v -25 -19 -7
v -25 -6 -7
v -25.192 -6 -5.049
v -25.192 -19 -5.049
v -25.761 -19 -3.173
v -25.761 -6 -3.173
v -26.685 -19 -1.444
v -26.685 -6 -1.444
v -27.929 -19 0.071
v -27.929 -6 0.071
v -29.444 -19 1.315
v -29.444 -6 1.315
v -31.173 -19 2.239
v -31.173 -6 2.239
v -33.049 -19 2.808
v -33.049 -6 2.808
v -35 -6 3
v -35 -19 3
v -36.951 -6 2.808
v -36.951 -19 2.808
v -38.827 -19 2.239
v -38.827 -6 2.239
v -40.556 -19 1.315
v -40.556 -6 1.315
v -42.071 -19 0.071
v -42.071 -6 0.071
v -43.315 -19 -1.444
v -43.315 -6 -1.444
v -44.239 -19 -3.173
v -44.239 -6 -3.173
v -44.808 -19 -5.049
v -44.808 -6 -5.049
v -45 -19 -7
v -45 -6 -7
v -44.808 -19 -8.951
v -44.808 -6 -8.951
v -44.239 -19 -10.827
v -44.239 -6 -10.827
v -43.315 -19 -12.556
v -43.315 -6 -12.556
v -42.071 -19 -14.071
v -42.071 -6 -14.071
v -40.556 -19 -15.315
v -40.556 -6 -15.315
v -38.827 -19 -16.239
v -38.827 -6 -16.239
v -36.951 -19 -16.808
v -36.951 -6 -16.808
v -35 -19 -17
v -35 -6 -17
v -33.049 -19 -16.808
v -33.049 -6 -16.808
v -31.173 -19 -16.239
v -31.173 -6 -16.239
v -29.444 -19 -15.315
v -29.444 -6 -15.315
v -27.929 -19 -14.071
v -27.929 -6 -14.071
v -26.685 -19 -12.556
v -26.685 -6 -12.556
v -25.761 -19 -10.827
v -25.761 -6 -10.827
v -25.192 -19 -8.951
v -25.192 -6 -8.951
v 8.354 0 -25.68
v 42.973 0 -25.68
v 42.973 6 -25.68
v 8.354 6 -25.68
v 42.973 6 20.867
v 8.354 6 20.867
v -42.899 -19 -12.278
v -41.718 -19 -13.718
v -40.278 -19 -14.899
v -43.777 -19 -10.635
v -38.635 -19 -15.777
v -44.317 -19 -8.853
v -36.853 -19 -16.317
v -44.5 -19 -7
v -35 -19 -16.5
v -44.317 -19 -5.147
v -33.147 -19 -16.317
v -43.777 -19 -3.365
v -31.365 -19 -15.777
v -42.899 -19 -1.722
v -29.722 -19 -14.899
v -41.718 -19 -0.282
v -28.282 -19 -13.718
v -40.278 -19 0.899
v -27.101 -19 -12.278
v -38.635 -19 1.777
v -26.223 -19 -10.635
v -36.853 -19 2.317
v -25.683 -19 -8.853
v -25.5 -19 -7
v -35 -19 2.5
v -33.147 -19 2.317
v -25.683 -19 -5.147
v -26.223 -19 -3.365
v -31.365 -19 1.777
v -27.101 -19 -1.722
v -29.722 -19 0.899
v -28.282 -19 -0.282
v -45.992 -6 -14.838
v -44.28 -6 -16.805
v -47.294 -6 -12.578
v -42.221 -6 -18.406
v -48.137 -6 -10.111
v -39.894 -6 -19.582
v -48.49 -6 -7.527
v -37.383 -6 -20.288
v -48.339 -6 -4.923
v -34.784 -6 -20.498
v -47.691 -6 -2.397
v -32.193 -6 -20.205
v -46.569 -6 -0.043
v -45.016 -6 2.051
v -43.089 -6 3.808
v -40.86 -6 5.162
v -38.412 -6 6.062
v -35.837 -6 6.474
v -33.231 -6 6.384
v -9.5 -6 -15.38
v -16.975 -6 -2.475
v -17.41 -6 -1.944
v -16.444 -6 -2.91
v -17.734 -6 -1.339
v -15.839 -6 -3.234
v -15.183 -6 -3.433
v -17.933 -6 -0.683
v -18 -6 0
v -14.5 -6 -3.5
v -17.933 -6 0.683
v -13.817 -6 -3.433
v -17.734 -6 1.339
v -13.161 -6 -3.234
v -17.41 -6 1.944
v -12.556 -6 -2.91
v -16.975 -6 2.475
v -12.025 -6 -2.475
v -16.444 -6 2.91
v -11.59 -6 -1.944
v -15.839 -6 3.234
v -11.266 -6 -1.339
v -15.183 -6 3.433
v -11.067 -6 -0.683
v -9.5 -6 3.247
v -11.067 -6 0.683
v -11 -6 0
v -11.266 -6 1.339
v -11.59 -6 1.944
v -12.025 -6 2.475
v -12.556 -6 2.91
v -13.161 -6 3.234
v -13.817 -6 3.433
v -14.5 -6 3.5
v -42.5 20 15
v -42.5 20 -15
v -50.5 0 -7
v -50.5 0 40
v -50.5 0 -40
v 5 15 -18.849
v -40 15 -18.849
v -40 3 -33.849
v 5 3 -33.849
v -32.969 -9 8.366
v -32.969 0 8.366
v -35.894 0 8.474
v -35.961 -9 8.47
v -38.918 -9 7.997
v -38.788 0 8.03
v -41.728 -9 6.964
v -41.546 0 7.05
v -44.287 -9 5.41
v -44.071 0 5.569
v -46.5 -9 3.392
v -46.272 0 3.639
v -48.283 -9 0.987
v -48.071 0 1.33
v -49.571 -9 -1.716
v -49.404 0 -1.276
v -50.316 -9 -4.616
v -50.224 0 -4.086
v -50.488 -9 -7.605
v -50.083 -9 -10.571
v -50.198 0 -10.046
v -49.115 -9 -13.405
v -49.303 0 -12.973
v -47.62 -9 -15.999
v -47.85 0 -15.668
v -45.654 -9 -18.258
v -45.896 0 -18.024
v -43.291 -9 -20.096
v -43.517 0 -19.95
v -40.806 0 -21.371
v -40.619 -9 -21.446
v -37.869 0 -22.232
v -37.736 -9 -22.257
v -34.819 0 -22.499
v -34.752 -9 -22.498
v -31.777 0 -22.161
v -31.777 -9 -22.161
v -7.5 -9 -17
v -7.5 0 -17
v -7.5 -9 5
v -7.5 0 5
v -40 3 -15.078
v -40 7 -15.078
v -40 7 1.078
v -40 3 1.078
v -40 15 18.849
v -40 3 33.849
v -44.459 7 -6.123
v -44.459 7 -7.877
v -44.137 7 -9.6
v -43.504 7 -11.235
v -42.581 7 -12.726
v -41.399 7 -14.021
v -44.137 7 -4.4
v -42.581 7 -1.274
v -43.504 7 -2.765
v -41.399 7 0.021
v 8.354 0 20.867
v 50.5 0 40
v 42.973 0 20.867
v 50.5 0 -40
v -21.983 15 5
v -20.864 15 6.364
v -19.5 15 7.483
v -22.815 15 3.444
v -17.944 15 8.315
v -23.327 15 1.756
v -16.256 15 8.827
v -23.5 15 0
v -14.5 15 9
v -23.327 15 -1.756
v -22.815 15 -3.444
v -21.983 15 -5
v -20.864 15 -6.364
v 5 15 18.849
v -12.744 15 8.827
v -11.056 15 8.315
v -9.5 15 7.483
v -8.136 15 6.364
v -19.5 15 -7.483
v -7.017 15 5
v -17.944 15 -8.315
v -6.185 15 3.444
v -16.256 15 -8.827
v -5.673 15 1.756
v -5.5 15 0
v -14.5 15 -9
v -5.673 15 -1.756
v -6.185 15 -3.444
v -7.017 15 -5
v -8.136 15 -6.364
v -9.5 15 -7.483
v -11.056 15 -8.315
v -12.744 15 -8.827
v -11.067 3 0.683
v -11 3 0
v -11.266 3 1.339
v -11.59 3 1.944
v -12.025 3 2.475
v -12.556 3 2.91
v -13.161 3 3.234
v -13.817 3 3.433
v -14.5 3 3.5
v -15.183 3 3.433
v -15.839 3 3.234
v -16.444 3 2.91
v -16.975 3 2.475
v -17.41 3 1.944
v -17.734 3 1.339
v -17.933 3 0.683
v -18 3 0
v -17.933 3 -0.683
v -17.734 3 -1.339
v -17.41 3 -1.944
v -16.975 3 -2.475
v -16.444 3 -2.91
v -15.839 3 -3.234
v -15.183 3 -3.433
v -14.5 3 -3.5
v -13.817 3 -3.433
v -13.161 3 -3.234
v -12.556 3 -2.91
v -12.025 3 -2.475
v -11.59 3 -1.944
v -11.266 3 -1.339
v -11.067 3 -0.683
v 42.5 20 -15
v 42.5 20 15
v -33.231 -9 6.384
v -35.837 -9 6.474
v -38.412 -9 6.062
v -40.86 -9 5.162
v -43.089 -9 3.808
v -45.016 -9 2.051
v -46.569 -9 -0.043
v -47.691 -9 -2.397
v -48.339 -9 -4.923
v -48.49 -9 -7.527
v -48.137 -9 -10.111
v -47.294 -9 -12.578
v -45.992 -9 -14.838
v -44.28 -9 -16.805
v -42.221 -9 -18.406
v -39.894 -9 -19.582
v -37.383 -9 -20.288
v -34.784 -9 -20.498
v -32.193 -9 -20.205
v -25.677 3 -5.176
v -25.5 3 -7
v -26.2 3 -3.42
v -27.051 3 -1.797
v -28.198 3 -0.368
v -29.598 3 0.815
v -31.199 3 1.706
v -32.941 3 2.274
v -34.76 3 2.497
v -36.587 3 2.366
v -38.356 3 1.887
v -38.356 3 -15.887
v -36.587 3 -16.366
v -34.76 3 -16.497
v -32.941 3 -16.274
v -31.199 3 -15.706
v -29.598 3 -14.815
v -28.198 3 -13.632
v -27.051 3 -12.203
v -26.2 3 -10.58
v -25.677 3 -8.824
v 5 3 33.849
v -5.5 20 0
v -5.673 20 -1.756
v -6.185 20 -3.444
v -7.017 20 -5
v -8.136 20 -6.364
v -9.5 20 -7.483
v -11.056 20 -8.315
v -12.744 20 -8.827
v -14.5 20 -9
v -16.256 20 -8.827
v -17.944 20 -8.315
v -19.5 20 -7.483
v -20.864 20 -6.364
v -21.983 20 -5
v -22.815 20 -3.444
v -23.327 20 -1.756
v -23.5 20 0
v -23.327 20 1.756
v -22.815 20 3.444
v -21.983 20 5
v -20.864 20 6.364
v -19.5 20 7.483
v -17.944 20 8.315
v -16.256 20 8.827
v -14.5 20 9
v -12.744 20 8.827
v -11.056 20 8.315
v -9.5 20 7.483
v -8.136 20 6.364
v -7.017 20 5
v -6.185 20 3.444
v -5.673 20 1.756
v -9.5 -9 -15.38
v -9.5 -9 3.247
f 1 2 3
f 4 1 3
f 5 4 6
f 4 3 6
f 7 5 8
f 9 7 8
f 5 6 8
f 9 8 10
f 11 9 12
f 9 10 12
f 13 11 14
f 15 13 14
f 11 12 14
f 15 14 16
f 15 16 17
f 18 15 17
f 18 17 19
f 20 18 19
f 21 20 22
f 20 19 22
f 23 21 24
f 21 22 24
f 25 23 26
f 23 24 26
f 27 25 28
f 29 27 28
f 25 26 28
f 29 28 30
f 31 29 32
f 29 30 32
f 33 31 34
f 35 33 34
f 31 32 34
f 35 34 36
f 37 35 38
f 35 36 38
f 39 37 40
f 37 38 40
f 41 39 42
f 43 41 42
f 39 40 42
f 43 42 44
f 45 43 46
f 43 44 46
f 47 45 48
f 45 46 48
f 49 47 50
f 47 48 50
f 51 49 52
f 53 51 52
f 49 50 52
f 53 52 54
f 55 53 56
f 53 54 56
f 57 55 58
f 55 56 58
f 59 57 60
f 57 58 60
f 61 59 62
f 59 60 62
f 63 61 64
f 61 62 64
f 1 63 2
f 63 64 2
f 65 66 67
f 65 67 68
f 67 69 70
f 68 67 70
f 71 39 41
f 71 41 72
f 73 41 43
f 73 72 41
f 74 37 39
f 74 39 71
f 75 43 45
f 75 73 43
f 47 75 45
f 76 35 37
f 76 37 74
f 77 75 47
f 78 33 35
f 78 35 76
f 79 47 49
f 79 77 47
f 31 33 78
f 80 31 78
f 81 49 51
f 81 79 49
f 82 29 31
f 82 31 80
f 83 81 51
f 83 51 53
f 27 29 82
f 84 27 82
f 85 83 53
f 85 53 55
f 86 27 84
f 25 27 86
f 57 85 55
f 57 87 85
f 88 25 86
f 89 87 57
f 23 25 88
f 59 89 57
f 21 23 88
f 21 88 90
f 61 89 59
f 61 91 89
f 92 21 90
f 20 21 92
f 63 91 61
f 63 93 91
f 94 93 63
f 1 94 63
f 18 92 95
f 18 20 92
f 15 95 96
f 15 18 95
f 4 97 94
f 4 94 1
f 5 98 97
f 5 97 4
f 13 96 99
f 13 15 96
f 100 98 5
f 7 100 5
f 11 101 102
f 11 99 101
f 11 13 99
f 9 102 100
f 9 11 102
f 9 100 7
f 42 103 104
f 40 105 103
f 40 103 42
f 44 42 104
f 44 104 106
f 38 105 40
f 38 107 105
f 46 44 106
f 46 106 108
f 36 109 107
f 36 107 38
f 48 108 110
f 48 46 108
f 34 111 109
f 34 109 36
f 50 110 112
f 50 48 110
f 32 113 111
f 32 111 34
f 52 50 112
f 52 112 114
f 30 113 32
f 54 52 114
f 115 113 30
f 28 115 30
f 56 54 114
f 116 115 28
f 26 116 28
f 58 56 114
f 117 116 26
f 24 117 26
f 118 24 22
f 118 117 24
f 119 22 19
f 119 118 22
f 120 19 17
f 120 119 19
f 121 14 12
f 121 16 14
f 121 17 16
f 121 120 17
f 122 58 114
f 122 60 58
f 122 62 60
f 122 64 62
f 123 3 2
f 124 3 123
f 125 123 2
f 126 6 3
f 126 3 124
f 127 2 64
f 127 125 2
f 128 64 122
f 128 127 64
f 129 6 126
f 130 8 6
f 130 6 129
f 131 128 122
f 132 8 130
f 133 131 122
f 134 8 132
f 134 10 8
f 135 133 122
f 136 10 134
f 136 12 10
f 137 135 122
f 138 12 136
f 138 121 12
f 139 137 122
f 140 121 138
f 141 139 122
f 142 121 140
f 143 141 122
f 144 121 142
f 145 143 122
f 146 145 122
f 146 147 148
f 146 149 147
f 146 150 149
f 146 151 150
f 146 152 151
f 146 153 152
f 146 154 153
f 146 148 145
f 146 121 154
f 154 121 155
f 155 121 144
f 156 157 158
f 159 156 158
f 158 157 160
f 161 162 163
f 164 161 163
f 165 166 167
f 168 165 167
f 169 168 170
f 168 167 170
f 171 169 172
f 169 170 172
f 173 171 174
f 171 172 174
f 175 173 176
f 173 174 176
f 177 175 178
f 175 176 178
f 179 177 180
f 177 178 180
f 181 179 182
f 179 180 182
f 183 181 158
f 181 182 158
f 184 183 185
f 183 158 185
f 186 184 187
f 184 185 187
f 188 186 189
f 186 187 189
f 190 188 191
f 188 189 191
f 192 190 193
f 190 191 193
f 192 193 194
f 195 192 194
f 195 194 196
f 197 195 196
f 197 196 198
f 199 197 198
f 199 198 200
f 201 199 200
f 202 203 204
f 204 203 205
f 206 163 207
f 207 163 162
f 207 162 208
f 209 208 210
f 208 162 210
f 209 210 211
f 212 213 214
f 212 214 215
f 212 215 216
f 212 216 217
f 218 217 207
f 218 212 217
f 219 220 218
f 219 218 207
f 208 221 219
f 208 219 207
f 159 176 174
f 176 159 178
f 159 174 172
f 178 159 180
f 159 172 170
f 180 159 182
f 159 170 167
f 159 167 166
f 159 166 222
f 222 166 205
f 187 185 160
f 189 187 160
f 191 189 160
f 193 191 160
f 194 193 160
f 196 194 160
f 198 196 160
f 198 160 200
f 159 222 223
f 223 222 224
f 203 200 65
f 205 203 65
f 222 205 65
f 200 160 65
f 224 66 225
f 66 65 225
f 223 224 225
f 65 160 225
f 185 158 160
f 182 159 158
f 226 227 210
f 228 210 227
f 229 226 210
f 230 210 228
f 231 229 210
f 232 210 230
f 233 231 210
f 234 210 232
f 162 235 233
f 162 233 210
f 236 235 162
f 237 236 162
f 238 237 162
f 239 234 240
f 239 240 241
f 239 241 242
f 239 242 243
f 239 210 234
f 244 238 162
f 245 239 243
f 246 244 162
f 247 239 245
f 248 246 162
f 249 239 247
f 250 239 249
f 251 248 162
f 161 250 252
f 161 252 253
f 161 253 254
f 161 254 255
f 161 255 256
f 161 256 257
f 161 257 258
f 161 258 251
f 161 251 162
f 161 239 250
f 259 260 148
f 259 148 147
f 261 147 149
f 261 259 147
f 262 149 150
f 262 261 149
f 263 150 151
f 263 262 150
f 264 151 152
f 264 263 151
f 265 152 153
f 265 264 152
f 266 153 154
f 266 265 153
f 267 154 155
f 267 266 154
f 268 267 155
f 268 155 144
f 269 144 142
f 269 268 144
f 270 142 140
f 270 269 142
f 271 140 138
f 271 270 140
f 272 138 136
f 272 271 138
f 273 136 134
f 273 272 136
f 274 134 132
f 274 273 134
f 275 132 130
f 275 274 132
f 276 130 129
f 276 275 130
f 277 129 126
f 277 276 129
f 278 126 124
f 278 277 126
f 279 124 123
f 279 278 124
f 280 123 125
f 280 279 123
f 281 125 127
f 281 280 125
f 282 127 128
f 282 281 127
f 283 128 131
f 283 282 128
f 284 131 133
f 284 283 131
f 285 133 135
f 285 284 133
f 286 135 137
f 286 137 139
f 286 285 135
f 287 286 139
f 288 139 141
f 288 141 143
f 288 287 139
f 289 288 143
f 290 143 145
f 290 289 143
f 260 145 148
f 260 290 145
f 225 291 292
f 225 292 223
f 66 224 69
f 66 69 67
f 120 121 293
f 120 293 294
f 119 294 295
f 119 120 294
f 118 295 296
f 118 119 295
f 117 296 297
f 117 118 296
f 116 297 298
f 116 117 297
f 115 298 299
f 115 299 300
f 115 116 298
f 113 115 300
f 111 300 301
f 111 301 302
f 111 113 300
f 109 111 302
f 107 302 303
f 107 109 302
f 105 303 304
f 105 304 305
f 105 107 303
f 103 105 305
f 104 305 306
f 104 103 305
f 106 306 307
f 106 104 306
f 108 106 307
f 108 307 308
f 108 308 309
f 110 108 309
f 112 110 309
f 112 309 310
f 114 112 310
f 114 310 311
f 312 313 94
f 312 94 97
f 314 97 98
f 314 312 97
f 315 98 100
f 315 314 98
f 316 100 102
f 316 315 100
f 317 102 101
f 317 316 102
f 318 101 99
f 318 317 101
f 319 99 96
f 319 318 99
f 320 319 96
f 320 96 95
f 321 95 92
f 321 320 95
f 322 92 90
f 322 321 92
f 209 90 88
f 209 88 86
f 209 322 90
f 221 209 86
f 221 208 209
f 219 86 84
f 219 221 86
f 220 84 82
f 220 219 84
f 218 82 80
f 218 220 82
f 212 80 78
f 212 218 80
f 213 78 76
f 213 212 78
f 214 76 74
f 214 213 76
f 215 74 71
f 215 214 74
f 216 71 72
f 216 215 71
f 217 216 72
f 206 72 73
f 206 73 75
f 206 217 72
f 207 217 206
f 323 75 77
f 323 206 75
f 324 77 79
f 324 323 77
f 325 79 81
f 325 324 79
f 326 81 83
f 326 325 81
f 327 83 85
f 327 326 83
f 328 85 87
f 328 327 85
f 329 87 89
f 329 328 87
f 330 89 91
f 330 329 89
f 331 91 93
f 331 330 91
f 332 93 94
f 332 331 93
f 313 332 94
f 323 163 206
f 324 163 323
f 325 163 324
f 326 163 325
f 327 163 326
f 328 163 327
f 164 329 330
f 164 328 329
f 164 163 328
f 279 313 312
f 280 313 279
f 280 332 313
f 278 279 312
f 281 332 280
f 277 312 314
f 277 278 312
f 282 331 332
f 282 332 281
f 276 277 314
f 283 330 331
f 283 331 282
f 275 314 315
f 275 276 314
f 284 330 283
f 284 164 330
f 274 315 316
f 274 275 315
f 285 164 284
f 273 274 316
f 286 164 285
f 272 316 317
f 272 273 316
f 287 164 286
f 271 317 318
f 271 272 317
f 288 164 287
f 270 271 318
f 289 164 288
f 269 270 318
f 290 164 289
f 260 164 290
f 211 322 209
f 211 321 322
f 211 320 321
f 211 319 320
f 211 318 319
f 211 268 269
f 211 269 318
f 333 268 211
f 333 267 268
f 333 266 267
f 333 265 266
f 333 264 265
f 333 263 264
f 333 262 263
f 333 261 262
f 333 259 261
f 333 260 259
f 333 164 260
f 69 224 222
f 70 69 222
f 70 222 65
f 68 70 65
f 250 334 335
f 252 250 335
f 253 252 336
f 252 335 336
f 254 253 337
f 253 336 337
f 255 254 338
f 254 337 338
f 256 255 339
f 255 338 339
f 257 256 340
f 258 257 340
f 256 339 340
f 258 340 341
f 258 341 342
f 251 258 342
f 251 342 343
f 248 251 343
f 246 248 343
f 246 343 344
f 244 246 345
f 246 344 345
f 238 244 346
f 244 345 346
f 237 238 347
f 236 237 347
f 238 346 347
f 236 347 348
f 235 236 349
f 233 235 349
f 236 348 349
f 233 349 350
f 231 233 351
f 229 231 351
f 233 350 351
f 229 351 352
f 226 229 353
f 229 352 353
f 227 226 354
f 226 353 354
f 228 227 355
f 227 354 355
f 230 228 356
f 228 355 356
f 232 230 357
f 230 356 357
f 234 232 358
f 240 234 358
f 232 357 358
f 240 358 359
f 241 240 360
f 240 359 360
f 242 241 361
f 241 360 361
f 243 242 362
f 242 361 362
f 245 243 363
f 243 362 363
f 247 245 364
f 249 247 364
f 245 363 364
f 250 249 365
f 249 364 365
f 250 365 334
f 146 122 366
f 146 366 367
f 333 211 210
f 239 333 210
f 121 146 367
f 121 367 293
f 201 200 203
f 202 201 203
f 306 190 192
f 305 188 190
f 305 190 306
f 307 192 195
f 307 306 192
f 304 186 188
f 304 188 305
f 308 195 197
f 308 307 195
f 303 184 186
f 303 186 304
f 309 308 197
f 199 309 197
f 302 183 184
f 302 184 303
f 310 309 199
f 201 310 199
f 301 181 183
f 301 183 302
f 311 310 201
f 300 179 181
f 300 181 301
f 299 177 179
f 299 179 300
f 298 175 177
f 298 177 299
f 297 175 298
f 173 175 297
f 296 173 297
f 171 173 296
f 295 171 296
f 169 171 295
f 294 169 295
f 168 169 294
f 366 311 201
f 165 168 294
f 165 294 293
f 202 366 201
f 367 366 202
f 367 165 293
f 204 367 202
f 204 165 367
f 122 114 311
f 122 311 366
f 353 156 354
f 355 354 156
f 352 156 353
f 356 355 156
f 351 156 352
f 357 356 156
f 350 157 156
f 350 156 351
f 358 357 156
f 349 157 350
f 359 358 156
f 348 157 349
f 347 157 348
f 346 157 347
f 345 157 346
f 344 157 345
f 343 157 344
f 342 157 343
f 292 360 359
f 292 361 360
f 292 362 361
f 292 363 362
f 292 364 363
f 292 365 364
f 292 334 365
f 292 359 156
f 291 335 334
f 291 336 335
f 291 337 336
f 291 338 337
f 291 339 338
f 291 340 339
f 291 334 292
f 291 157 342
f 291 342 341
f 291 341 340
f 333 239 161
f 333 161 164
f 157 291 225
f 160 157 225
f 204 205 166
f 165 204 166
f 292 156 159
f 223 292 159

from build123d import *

# Parameters (mm, degrees)
SKETCH1_W                       = 85
SKETCH1_H                       = 30
BOSS_EXTRUDE1_DEPTH             = 20
BOSS_EXTRUDE2_DEPTH             = 85
BOSS_EXTRUDE3_REACH             = 42
BOSS_EXTRUDE3_DIRECTION_2_REACH = 42
SKETCH4_R                       = 3.5
CUT_EXTRUDE1_DEPTH              = 21
SKETCH5_R                       = 9
CUT_EXTRUDE2_DEPTH              = 5
BOSS_EXTRUDE4_DEPTH             = 9
SKETCH6_3_R                     = 9.5
CUT_EXTRUDE3_DEPTH              = 7
SKETCH6_4_R                     = 9.5
SKETCH6_4_R_2                   = 3.5
BOSS_EXTRUDE5_DEPTH             = 6
SKETCH8_R                       = 10
SKETCH8_R_2                     = 9.5
BOSS_EXTRUDE6_DEPTH             = 13
CUT_EXTRUDE4_DEPTH              = 5
CUT_EXTRUDE4_DEPTH_BACK         = 40
SKETCH10_W                      = 34.61835073
SKETCH10_H                      = 46.546399138
CUT_EXTRUDE5_DEPTH              = 6


with BuildPart() as part:
    # Sketch1 → Boss-Extrude1 (new body)
    with BuildSketch(Plane(origin=(0, 0, 0), x_dir=(1, 0, 0), z_dir=(0, 1, 0))):
        Rectangle(SKETCH1_W, SKETCH1_H)
    extrude(amount=BOSS_EXTRUDE1_DEPTH)

    # Sketch2 → Boss-Extrude2 (add)
    with BuildSketch(Plane(origin=(42.5, 0, 0), x_dir=(0, 0, -1), z_dir=(1, 0, 0))):
        Polygon((15, 20), (40, 0), (15, 0), align=None)
        Polygon((-15, 20), (-40, 0), (-15, 0), align=None)
    extrude(amount=-BOSS_EXTRUDE2_DEPTH)

    # Boss-Extrude3: up to this face of the body (flat: up to its plane)
    boss_extrude3_end = Plane(part.part.faces().sort_by_distance((0, 10, -27.5))[0])
    # Sketch3 → Boss-Extrude3 (add, up to the picked face)
    with BuildSketch(Plane.XY, mode=Mode.PRIVATE) as boss_extrude3_sk1:
        Polygon((42.5, 20), (50.5, 0), (42.5, 0), align=None)
    boss_extrude3_tool1 = split(extrude(boss_extrude3_sk1.sketch, amount=-BOSS_EXTRUDE3_REACH, mode=Mode.PRIVATE), bisect_by=boss_extrude3_end, keep=Keep.BOTH, mode=Mode.PRIVATE)
    add(boss_extrude3_tool1.solids().sort_by_distance((45.166667, 6.666667, 0))[0])
    # Sketch3 → Boss-Extrude3 (add, up to the picked face)
    with BuildSketch(Plane.XY, mode=Mode.PRIVATE) as boss_extrude3_sk2:
        Polygon((-42.5, 0), (-42.5, 20), (-50.5, 0), align=None)
    boss_extrude3_tool2 = split(extrude(boss_extrude3_sk2.sketch, amount=-BOSS_EXTRUDE3_REACH, mode=Mode.PRIVATE), bisect_by=boss_extrude3_end, keep=Keep.BOTH, mode=Mode.PRIVATE)
    add(boss_extrude3_tool2.solids().sort_by_distance((-45.166667, 6.666667, 0))[0])

    # Boss-Extrude3 direction 2: up to this face of the body (flat: up to its plane)
    boss_extrude3_direction_2_end = Plane(part.part.faces().sort_by_distance((0, 10, 27.5))[0])
    # Sketch3 → Boss-Extrude3 direction 2 (add, up to the picked face)
    with BuildSketch(Plane.XY, mode=Mode.PRIVATE) as boss_extrude3_direction_2_sk1:
        Polygon((42.5, 20), (50.5, 0), (42.5, 0), align=None)
    boss_extrude3_direction_2_tool1 = split(extrude(boss_extrude3_direction_2_sk1.sketch, amount=BOSS_EXTRUDE3_DIRECTION_2_REACH, mode=Mode.PRIVATE), bisect_by=boss_extrude3_direction_2_end, keep=Keep.BOTH, mode=Mode.PRIVATE)
    add(boss_extrude3_direction_2_tool1.solids().sort_by_distance((45.166667, 6.666667, 0))[0])
    # Sketch3 → Boss-Extrude3 direction 2 (add, up to the picked face)
    with BuildSketch(Plane.XY, mode=Mode.PRIVATE) as boss_extrude3_direction_2_sk2:
        Polygon((-42.5, 0), (-42.5, 20), (-50.5, 0), align=None)
    boss_extrude3_direction_2_tool2 = split(extrude(boss_extrude3_direction_2_sk2.sketch, amount=BOSS_EXTRUDE3_DIRECTION_2_REACH, mode=Mode.PRIVATE), bisect_by=boss_extrude3_direction_2_end, keep=Keep.BOTH, mode=Mode.PRIVATE)
    add(boss_extrude3_direction_2_tool2.solids().sort_by_distance((-45.166667, 6.666667, 0))[0])

    # Sketch4 → Cut-Extrude1 (cut, through all)
    with BuildSketch(Plane(origin=(0, 20, 0), x_dir=(1, 0, 0), z_dir=(0, 1, 0))):
        with Locations((-14.5, 0)):
            Circle(SKETCH4_R)
    extrude(amount=-CUT_EXTRUDE1_DEPTH, mode=Mode.SUBTRACT)

    # Sketch5 → Cut-Extrude2 (cut)
    with BuildSketch(Plane(origin=(0, 20, 0), x_dir=(1, 0, 0), z_dir=(0, 1, 0))):
        with Locations((-14.5, 0)):
            Circle(SKETCH5_R)
    extrude(amount=-CUT_EXTRUDE2_DEPTH, mode=Mode.SUBTRACT)

    # Sketch6 → Boss-Extrude4 (add)
    with BuildSketch(Plane.XZ):
        with BuildLine():
            Line((-7.5, 5), (-32.968954756, 8.36635465))
            ThreePointArc((-32.968954756, 8.36635465), (-50.488194155, -7.60484858), (-31.776786955, -22.161164126))
            Line((-31.776786955, -22.161164126), (-7.5, -17))
            Line((-7.5, -17), (-7.5, 5))
        make_face()
        with BuildLine():
            ThreePointArc((-33.23102511, 6.383599211), (-48.48971749, -7.526803602), (-32.192685412, -20.204884884))
            Line((-32.192685412, -20.204884884), (-9.5, -15.380495475))
            Line((-9.5, -15.380495475), (-9.5, 3.246955109))
            Line((-9.5, 3.246955109), (-33.23102511, 6.383599211))
        make_face(mode=Mode.SUBTRACT)
    extrude(amount=BOSS_EXTRUDE4_DEPTH)

    # Sketch6<3> → Cut-Extrude3 (cut)
    with BuildSketch(Plane.XZ):
        with Locations((-35, -7)):
            Circle(SKETCH6_3_R)
    extrude(amount=-CUT_EXTRUDE3_DEPTH, mode=Mode.SUBTRACT)

    # Sketch6<4> → Boss-Extrude5 (add)
    with BuildSketch(Plane.XZ):
        with BuildLine():
            Line((-9.5, 3.246955109), (-33.23102511, 6.383599211))
            ThreePointArc((-33.23102511, 6.383599211), (-48.48971749, -7.526803602), (-32.192685412, -20.204884884))
            Line((-32.192685412, -20.204884884), (-9.5, -15.380495475))
            Line((-9.5, -15.380495475), (-9.5, 3.246955109))
        make_face()
        with Locations((-35, -7)):
            Circle(SKETCH6_4_R, mode=Mode.SUBTRACT)
        with Locations((-14.5, 0)):
            Circle(SKETCH6_4_R_2, mode=Mode.SUBTRACT)
    extrude(amount=BOSS_EXTRUDE5_DEPTH)

    # Sketch8 → Boss-Extrude6 (add)
    with BuildSketch(Plane.XZ.offset(6)):
        with Locations((-35, -7)):
            Circle(SKETCH8_R)
        with Locations((-35, -7)):
            Circle(SKETCH8_R_2, mode=Mode.SUBTRACT)
    extrude(amount=BOSS_EXTRUDE6_DEPTH)

    # Sketch9 → Cut-Extrude4 (cut, two sides)
    with BuildSketch(Plane(origin=(0, 0, 0), x_dir=(0, 0, -1), z_dir=(1, 0, 0))) as cut_extrude4_sk:
        Polygon((33.848828411, 3), (-33.848828411, 3), (-18.848828411, 15), (18.848828411, 15), align=None)
    extrude(amount=CUT_EXTRUDE4_DEPTH, mode=Mode.SUBTRACT)
    extrude(cut_extrude4_sk.sketch, amount=-CUT_EXTRUDE4_DEPTH_BACK, mode=Mode.SUBTRACT)

    # Sketch10 → Cut-Extrude5 (cut)
    with BuildSketch(Plane(origin=(0, 0, 0), x_dir=(-1, 0, 0), z_dir=(0, -1, 0))):
        with Locations((-25.663362502, 2.40647956)):
            Rectangle(SKETCH10_W, SKETCH10_H)
    extrude(amount=-CUT_EXTRUDE5_DEPTH, mode=Mode.SUBTRACT)


solid = part.part
